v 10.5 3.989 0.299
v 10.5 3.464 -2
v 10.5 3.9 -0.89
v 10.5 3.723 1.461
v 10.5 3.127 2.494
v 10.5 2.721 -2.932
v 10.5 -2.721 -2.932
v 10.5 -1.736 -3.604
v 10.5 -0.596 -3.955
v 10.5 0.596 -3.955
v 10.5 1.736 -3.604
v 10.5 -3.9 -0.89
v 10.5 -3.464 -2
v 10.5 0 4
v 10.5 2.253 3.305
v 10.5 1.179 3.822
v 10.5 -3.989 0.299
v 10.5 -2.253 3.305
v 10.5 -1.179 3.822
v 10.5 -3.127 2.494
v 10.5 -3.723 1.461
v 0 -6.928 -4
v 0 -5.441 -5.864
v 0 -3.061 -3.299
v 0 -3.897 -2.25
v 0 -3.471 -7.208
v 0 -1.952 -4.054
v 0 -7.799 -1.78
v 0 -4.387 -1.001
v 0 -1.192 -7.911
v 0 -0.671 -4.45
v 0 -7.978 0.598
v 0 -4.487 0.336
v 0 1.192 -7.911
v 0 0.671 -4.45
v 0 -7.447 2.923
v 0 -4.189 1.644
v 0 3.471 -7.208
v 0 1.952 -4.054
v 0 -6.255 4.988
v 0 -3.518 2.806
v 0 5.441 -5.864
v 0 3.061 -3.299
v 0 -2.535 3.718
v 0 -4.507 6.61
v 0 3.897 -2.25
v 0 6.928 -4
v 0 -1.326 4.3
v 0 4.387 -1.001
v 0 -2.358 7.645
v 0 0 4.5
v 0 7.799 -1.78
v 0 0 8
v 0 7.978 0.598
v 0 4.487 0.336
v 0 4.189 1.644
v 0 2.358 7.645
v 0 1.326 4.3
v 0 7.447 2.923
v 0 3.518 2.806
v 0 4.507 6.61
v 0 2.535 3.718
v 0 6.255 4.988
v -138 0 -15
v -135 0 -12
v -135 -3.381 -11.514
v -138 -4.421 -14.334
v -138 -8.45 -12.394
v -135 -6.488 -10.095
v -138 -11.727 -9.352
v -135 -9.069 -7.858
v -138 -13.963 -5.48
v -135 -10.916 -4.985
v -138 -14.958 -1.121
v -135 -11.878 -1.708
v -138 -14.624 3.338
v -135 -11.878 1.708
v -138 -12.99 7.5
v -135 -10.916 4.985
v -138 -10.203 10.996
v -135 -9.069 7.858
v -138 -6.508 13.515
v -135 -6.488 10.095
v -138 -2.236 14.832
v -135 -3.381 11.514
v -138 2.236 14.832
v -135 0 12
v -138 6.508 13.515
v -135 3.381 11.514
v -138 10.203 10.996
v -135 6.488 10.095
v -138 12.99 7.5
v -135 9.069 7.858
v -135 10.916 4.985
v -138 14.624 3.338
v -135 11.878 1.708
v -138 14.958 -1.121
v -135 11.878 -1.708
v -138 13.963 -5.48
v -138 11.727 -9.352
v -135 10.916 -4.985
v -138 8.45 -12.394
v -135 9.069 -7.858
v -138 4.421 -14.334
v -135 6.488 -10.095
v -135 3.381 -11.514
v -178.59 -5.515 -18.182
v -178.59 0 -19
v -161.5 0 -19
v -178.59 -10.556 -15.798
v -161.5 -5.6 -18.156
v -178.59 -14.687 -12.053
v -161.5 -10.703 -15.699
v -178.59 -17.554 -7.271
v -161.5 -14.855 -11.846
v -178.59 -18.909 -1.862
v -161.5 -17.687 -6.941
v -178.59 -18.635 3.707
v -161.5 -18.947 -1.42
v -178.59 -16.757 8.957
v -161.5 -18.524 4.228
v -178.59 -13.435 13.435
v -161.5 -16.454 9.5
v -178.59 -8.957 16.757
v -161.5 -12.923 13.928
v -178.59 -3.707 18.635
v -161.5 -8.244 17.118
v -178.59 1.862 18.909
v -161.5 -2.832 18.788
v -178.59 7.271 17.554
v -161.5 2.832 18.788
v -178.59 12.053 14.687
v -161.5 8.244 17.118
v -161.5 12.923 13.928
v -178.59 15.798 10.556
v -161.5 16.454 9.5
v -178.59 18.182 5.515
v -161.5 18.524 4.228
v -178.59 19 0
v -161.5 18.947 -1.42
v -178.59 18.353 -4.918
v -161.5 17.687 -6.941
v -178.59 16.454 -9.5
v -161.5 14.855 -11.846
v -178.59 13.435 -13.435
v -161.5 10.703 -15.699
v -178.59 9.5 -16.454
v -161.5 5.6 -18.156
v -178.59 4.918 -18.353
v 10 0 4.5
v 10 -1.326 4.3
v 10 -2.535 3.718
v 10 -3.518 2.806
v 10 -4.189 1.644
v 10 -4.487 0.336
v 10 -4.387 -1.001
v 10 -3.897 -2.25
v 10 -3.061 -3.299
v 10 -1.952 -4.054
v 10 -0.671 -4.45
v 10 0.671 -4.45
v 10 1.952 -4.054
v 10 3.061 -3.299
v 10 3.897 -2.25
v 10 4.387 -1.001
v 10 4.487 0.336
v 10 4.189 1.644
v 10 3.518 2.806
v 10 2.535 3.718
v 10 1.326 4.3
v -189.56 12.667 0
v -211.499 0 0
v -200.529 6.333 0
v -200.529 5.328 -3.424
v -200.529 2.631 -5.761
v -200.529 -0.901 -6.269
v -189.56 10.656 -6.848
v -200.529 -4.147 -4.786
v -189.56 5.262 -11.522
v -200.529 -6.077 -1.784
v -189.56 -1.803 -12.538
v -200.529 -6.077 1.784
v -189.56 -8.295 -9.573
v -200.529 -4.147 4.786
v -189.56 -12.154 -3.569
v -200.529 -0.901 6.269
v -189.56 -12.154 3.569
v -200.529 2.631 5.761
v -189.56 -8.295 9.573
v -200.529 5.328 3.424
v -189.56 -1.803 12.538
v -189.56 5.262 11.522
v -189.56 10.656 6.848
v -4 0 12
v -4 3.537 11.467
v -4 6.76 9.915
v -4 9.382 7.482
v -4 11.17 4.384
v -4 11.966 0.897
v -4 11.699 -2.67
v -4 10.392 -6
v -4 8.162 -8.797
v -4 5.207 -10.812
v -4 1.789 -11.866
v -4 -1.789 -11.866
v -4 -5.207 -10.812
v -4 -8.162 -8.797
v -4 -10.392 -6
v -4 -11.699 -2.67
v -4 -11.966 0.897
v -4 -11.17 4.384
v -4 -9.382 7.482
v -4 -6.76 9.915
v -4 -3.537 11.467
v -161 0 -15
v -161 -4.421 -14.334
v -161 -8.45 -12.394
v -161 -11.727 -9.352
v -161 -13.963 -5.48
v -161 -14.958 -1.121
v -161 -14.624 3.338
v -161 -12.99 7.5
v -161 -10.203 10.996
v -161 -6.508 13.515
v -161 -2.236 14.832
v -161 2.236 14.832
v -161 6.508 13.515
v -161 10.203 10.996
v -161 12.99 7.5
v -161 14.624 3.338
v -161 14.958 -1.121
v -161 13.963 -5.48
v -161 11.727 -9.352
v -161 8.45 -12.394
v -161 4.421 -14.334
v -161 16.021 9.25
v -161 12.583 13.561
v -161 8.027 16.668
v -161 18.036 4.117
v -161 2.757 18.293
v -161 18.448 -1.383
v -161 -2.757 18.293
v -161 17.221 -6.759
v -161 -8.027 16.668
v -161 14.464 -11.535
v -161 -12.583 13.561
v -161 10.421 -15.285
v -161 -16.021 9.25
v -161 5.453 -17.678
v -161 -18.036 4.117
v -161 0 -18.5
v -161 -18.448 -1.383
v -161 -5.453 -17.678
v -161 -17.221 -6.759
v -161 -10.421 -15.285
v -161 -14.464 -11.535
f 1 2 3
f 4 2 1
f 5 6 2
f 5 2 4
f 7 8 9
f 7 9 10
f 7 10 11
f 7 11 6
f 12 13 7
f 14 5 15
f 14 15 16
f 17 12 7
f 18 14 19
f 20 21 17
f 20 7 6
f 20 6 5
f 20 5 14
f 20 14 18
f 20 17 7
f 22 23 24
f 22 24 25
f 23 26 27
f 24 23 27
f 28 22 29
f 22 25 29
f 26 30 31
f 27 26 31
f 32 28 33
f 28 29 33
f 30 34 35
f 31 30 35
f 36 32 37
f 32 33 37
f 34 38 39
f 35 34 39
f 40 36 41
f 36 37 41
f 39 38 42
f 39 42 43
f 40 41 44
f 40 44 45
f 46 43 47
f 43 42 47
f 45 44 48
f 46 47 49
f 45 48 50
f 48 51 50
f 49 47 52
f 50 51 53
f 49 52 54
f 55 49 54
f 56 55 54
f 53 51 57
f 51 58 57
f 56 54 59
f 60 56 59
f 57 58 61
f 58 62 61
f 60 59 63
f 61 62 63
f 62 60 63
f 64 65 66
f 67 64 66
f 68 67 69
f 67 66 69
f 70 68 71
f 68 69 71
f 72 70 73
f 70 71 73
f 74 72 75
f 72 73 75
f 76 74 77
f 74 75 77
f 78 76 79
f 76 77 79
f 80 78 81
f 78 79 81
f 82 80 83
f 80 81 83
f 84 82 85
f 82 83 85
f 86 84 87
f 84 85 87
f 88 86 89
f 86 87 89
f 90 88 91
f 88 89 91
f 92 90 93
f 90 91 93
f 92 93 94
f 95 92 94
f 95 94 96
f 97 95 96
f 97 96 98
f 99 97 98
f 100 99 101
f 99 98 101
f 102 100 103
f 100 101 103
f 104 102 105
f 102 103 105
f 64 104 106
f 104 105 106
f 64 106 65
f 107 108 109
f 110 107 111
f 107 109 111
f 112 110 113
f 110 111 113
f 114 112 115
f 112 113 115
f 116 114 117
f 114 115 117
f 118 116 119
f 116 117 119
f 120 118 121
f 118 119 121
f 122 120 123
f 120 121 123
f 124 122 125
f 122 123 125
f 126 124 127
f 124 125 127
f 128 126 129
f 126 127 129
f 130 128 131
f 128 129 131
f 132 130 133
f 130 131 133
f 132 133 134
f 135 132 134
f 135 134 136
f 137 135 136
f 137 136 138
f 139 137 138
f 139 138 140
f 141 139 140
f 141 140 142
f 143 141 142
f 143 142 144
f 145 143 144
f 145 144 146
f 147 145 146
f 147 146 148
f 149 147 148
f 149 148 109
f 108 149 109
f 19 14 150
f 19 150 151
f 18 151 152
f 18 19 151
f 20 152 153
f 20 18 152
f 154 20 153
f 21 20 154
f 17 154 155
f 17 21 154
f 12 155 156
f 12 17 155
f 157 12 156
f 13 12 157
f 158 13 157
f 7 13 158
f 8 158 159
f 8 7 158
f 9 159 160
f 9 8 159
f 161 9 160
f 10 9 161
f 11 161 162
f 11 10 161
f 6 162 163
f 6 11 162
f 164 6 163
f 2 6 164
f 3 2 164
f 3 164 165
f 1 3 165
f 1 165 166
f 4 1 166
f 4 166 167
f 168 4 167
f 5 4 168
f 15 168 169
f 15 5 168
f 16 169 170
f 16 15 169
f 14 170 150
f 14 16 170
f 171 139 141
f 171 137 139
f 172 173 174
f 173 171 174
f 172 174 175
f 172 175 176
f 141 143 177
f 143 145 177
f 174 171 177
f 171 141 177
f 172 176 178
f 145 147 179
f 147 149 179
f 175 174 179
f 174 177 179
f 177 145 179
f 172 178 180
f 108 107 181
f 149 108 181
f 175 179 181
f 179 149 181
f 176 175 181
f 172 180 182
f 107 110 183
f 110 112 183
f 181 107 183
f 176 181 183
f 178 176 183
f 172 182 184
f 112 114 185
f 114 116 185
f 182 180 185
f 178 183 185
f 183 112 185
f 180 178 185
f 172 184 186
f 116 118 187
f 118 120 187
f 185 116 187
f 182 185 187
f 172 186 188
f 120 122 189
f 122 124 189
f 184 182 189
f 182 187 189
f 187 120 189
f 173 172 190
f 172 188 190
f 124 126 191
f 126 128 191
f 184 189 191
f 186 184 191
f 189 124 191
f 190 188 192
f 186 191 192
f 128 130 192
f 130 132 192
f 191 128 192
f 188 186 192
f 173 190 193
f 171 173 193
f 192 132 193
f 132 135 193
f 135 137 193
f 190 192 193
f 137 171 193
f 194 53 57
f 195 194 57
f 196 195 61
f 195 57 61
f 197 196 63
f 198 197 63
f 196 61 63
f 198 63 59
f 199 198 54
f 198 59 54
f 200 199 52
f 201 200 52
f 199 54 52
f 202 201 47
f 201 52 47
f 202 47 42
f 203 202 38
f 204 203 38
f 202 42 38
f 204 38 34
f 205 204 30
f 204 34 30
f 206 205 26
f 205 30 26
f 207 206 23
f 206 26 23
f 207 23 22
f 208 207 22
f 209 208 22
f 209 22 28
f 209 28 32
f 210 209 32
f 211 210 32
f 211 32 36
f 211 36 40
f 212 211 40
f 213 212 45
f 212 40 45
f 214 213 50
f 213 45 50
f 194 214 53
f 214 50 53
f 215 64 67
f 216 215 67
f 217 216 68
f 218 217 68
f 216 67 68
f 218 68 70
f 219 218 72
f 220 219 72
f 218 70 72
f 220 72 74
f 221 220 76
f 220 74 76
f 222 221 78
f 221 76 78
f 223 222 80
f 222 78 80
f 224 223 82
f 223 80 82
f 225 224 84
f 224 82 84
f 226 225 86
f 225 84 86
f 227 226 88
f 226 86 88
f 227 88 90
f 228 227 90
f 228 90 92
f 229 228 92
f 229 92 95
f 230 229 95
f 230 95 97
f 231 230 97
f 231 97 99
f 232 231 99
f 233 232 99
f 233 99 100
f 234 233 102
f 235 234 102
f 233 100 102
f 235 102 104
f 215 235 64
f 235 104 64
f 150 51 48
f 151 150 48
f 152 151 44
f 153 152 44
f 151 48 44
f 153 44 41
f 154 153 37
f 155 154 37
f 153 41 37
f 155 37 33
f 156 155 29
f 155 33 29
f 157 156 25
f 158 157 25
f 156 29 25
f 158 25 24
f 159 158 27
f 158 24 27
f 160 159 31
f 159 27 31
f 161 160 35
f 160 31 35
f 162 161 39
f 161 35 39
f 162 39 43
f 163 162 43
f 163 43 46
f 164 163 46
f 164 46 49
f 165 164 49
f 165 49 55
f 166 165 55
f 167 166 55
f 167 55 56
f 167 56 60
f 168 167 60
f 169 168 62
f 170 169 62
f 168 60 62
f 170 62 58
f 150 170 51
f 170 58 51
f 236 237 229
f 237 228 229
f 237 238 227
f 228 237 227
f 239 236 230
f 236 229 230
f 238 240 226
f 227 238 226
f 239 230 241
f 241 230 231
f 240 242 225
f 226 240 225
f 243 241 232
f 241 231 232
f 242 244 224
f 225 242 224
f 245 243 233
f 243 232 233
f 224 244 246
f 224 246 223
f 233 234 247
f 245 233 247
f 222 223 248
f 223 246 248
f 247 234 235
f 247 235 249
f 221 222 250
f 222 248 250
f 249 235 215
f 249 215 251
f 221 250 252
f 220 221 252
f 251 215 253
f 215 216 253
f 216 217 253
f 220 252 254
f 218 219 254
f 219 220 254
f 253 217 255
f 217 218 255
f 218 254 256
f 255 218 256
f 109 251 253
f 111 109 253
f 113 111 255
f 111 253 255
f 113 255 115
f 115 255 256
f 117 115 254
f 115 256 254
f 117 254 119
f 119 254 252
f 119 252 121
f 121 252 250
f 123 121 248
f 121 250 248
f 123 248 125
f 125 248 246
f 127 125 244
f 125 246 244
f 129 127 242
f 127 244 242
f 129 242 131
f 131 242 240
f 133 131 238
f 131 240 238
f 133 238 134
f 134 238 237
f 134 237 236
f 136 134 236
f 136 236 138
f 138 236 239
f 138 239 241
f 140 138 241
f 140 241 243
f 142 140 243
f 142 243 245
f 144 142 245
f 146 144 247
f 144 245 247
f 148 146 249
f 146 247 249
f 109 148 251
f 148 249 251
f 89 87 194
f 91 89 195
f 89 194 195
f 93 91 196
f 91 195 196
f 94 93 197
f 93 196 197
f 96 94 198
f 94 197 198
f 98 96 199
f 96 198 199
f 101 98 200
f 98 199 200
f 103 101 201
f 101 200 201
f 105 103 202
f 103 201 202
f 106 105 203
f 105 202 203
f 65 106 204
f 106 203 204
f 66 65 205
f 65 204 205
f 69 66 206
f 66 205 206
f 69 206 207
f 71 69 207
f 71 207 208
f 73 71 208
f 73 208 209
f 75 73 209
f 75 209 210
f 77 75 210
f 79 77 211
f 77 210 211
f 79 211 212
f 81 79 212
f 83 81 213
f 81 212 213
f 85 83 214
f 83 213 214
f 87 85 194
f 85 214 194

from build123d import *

# Parameters (mm, degrees)
SZKIC5_R                    = 4.5
DODANIE_WYCI_GNI_CIE4_DEPTH = 10.5
SFAZOWANIE1_SIZE            = 0.5
SZKIC6_R                    = 12
DODANIE_WYCI_GNI_CIE5_DEPTH = 135
SFAZOWANIE2_SIZE            = 4
SZKIC7_R                    = 15
DODANIE_WYCI_GNI_CIE6_DEPTH = 26
SFAZOWANIE4_SIZE            = 3
SZKIC8_R                    = 19
DODANIE_WYCI_GNI_CIE7_DEPTH = 17.59
SFAZOWANIE5_SIZE            = 0.5


with BuildPart() as part:
    # Szkic5 → Dodanie-wyciągnięcie4 (new body)
    with BuildSketch(Plane(origin=(0, 0, 0), x_dir=(0, 0, -1), z_dir=(1, 0, 0))):
        with Locations(Location((0, 0, 0), (0, 0, 180))):
            Circle(SZKIC5_R)
    extrude(amount=DODANIE_WYCI_GNI_CIE4_DEPTH)

    # Sfazowanie1
    sfazowanie1_edges = [part.edges().sort_by_distance(p)[0] for p in [
        (10.5, 0, -4.5),
    ]]
    chamfer(sfazowanie1_edges, length=SFAZOWANIE1_SIZE)

    # Szkic6 → Dodanie-wyciągnięcie5 (add)
    with BuildSketch(Plane.ZY):
        Circle(SZKIC6_R)
    extrude(amount=DODANIE_WYCI_GNI_CIE5_DEPTH)

    # Sfazowanie2
    sfazowanie2_edges = [part.edges().sort_by_distance(p)[0] for p in [
        (0, 0, -12),
    ]]
    chamfer(sfazowanie2_edges, length=SFAZOWANIE2_SIZE)

    # Szkic7 → Dodanie-wyciągnięcie6 (add)
    with BuildSketch(Plane.ZY.offset(135)):
        with Locations(Location((0, 0, 0), (0, 0, 180))):
            Circle(SZKIC7_R)
    extrude(amount=DODANIE_WYCI_GNI_CIE6_DEPTH)

    # Sfazowanie4
    sfazowanie4_edges = [part.edges().sort_by_distance(p)[0] for p in [
        (-135, 0, 15),
    ]]
    chamfer(sfazowanie4_edges, length=SFAZOWANIE4_SIZE - 0.0001)  # a hair under: the kernel refuses the full size

    # Szkic8 → Dodanie-wyciągnięcie7 (add)
    with BuildSketch(Plane.ZY.offset(161)):
        with Locations(Location((0, 0, 0), (0, 0, 180))):
            Circle(SZKIC8_R)
    extrude(amount=DODANIE_WYCI_GNI_CIE7_DEPTH)

    # Szkic10 → Obrót1 (revolve)
    with BuildSketch(Plane.XY):
        Polygon((-211.498965344, 0), (-178.59, 19), (-178.59, 0), align=None)
    revolve(axis=Axis((-178.59, 0, 0), (-1, 0, 0)))

    # Sfazowanie5
    sfazowanie5_edges = [part.edges().sort_by_distance(p)[0] for p in [
        (-161, 0, 19),
    ]]
    chamfer(sfazowanie5_edges, length=SFAZOWANIE5_SIZE)


solid = part.part
